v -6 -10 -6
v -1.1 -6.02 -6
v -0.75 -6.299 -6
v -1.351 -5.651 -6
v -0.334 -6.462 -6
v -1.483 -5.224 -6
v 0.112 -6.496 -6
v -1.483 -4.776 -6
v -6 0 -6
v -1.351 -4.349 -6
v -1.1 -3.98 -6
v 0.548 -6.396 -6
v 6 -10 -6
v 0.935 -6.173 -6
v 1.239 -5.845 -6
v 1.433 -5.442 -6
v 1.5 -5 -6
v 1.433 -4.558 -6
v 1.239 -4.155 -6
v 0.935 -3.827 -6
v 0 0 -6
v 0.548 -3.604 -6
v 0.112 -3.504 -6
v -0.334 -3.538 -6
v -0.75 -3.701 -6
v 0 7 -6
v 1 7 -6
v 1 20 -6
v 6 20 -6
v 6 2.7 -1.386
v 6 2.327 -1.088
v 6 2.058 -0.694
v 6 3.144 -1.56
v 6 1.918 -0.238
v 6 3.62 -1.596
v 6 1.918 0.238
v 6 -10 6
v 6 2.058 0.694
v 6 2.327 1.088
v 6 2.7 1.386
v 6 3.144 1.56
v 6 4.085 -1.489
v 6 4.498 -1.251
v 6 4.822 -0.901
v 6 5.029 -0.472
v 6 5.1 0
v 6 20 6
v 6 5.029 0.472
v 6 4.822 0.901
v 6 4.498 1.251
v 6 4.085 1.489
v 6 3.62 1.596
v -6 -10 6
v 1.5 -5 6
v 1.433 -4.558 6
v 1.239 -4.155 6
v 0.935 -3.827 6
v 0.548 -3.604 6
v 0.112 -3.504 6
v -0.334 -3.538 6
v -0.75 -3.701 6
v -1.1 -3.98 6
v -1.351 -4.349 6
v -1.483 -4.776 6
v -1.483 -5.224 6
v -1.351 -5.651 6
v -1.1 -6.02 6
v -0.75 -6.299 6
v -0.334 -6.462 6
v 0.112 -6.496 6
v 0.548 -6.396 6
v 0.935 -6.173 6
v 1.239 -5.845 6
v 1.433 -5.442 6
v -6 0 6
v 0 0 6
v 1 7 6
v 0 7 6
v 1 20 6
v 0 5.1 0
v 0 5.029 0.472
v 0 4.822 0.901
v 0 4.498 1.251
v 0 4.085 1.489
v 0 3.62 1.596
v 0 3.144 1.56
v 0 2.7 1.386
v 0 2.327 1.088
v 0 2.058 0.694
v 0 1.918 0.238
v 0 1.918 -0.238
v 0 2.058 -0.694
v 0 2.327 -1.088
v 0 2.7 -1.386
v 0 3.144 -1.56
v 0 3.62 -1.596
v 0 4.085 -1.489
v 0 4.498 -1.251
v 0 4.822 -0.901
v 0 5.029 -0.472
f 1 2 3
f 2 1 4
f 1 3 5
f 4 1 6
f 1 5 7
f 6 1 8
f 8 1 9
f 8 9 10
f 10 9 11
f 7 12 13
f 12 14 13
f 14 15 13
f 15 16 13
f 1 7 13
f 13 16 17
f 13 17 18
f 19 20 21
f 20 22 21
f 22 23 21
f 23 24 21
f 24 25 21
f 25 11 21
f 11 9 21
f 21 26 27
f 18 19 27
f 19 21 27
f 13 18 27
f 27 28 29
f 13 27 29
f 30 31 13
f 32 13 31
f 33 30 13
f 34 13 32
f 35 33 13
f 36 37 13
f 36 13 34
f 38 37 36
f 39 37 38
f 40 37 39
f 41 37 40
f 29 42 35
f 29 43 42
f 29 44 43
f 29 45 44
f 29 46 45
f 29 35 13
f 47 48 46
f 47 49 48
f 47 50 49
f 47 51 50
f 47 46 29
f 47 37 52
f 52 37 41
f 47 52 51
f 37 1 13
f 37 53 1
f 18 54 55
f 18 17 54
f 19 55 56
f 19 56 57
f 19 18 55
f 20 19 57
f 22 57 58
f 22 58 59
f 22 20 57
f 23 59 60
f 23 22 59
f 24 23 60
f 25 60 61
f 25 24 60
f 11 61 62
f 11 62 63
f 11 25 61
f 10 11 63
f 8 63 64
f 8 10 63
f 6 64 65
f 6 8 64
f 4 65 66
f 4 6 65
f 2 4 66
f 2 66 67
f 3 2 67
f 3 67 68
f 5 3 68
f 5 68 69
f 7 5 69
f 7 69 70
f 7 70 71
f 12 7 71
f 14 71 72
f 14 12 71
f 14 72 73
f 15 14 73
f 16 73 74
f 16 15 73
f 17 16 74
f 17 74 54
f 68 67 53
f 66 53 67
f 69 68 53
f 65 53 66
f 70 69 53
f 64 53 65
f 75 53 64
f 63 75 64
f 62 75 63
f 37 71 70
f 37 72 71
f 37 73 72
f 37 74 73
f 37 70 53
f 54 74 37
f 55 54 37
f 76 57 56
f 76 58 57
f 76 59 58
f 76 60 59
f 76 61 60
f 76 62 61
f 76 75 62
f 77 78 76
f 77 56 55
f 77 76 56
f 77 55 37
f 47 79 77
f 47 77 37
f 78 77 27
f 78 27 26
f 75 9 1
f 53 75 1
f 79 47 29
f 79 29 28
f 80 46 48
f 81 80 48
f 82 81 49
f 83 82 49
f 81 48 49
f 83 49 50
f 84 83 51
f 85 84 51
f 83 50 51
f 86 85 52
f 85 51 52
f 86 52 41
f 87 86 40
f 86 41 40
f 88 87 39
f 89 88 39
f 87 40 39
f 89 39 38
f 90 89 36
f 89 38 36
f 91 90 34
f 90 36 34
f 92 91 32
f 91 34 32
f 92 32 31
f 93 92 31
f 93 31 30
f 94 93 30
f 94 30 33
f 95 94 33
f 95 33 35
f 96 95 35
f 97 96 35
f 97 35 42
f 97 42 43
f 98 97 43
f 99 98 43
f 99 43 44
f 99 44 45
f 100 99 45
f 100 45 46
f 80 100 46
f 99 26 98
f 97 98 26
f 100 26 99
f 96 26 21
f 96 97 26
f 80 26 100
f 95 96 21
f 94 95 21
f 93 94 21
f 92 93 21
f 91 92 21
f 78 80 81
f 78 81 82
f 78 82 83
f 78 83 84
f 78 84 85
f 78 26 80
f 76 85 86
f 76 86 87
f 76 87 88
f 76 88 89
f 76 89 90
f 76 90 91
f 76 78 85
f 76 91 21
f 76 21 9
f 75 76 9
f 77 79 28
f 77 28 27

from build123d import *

# Parameters (mm, degrees)
F0_R     = 1.5
F1_DEPTH = 6
F4_DEPTH = 25


with BuildPart() as f1:
    # F0 (on Top) → F1 (new body, symmetric)
    with BuildSketch(Plane.XY):
        Polygon((6, -10), (6, 20), (1, 20), (1, 7), (0, 7), (0, 0), (-6, 0), (-6, -10), align=None)
        with Locations((0, -5)):
            Circle(F0_R, mode=Mode.SUBTRACT)
    extrude(amount=F1_DEPTH, both=True)

    # F3 (on offset) → F4 (cut)
    with BuildSketch(Plane.YZ.offset(6)):
        with BuildLine():
            ThreePointArc((1.9, 0), (3.5, -1.6), (5.1, 0))
            ThreePointArc((5.1, 0), (3.5, 1.6), (1.9, 0))
        make_face()
    extrude(amount=-F4_DEPTH, mode=Mode.SUBTRACT)


solid = f1.part
